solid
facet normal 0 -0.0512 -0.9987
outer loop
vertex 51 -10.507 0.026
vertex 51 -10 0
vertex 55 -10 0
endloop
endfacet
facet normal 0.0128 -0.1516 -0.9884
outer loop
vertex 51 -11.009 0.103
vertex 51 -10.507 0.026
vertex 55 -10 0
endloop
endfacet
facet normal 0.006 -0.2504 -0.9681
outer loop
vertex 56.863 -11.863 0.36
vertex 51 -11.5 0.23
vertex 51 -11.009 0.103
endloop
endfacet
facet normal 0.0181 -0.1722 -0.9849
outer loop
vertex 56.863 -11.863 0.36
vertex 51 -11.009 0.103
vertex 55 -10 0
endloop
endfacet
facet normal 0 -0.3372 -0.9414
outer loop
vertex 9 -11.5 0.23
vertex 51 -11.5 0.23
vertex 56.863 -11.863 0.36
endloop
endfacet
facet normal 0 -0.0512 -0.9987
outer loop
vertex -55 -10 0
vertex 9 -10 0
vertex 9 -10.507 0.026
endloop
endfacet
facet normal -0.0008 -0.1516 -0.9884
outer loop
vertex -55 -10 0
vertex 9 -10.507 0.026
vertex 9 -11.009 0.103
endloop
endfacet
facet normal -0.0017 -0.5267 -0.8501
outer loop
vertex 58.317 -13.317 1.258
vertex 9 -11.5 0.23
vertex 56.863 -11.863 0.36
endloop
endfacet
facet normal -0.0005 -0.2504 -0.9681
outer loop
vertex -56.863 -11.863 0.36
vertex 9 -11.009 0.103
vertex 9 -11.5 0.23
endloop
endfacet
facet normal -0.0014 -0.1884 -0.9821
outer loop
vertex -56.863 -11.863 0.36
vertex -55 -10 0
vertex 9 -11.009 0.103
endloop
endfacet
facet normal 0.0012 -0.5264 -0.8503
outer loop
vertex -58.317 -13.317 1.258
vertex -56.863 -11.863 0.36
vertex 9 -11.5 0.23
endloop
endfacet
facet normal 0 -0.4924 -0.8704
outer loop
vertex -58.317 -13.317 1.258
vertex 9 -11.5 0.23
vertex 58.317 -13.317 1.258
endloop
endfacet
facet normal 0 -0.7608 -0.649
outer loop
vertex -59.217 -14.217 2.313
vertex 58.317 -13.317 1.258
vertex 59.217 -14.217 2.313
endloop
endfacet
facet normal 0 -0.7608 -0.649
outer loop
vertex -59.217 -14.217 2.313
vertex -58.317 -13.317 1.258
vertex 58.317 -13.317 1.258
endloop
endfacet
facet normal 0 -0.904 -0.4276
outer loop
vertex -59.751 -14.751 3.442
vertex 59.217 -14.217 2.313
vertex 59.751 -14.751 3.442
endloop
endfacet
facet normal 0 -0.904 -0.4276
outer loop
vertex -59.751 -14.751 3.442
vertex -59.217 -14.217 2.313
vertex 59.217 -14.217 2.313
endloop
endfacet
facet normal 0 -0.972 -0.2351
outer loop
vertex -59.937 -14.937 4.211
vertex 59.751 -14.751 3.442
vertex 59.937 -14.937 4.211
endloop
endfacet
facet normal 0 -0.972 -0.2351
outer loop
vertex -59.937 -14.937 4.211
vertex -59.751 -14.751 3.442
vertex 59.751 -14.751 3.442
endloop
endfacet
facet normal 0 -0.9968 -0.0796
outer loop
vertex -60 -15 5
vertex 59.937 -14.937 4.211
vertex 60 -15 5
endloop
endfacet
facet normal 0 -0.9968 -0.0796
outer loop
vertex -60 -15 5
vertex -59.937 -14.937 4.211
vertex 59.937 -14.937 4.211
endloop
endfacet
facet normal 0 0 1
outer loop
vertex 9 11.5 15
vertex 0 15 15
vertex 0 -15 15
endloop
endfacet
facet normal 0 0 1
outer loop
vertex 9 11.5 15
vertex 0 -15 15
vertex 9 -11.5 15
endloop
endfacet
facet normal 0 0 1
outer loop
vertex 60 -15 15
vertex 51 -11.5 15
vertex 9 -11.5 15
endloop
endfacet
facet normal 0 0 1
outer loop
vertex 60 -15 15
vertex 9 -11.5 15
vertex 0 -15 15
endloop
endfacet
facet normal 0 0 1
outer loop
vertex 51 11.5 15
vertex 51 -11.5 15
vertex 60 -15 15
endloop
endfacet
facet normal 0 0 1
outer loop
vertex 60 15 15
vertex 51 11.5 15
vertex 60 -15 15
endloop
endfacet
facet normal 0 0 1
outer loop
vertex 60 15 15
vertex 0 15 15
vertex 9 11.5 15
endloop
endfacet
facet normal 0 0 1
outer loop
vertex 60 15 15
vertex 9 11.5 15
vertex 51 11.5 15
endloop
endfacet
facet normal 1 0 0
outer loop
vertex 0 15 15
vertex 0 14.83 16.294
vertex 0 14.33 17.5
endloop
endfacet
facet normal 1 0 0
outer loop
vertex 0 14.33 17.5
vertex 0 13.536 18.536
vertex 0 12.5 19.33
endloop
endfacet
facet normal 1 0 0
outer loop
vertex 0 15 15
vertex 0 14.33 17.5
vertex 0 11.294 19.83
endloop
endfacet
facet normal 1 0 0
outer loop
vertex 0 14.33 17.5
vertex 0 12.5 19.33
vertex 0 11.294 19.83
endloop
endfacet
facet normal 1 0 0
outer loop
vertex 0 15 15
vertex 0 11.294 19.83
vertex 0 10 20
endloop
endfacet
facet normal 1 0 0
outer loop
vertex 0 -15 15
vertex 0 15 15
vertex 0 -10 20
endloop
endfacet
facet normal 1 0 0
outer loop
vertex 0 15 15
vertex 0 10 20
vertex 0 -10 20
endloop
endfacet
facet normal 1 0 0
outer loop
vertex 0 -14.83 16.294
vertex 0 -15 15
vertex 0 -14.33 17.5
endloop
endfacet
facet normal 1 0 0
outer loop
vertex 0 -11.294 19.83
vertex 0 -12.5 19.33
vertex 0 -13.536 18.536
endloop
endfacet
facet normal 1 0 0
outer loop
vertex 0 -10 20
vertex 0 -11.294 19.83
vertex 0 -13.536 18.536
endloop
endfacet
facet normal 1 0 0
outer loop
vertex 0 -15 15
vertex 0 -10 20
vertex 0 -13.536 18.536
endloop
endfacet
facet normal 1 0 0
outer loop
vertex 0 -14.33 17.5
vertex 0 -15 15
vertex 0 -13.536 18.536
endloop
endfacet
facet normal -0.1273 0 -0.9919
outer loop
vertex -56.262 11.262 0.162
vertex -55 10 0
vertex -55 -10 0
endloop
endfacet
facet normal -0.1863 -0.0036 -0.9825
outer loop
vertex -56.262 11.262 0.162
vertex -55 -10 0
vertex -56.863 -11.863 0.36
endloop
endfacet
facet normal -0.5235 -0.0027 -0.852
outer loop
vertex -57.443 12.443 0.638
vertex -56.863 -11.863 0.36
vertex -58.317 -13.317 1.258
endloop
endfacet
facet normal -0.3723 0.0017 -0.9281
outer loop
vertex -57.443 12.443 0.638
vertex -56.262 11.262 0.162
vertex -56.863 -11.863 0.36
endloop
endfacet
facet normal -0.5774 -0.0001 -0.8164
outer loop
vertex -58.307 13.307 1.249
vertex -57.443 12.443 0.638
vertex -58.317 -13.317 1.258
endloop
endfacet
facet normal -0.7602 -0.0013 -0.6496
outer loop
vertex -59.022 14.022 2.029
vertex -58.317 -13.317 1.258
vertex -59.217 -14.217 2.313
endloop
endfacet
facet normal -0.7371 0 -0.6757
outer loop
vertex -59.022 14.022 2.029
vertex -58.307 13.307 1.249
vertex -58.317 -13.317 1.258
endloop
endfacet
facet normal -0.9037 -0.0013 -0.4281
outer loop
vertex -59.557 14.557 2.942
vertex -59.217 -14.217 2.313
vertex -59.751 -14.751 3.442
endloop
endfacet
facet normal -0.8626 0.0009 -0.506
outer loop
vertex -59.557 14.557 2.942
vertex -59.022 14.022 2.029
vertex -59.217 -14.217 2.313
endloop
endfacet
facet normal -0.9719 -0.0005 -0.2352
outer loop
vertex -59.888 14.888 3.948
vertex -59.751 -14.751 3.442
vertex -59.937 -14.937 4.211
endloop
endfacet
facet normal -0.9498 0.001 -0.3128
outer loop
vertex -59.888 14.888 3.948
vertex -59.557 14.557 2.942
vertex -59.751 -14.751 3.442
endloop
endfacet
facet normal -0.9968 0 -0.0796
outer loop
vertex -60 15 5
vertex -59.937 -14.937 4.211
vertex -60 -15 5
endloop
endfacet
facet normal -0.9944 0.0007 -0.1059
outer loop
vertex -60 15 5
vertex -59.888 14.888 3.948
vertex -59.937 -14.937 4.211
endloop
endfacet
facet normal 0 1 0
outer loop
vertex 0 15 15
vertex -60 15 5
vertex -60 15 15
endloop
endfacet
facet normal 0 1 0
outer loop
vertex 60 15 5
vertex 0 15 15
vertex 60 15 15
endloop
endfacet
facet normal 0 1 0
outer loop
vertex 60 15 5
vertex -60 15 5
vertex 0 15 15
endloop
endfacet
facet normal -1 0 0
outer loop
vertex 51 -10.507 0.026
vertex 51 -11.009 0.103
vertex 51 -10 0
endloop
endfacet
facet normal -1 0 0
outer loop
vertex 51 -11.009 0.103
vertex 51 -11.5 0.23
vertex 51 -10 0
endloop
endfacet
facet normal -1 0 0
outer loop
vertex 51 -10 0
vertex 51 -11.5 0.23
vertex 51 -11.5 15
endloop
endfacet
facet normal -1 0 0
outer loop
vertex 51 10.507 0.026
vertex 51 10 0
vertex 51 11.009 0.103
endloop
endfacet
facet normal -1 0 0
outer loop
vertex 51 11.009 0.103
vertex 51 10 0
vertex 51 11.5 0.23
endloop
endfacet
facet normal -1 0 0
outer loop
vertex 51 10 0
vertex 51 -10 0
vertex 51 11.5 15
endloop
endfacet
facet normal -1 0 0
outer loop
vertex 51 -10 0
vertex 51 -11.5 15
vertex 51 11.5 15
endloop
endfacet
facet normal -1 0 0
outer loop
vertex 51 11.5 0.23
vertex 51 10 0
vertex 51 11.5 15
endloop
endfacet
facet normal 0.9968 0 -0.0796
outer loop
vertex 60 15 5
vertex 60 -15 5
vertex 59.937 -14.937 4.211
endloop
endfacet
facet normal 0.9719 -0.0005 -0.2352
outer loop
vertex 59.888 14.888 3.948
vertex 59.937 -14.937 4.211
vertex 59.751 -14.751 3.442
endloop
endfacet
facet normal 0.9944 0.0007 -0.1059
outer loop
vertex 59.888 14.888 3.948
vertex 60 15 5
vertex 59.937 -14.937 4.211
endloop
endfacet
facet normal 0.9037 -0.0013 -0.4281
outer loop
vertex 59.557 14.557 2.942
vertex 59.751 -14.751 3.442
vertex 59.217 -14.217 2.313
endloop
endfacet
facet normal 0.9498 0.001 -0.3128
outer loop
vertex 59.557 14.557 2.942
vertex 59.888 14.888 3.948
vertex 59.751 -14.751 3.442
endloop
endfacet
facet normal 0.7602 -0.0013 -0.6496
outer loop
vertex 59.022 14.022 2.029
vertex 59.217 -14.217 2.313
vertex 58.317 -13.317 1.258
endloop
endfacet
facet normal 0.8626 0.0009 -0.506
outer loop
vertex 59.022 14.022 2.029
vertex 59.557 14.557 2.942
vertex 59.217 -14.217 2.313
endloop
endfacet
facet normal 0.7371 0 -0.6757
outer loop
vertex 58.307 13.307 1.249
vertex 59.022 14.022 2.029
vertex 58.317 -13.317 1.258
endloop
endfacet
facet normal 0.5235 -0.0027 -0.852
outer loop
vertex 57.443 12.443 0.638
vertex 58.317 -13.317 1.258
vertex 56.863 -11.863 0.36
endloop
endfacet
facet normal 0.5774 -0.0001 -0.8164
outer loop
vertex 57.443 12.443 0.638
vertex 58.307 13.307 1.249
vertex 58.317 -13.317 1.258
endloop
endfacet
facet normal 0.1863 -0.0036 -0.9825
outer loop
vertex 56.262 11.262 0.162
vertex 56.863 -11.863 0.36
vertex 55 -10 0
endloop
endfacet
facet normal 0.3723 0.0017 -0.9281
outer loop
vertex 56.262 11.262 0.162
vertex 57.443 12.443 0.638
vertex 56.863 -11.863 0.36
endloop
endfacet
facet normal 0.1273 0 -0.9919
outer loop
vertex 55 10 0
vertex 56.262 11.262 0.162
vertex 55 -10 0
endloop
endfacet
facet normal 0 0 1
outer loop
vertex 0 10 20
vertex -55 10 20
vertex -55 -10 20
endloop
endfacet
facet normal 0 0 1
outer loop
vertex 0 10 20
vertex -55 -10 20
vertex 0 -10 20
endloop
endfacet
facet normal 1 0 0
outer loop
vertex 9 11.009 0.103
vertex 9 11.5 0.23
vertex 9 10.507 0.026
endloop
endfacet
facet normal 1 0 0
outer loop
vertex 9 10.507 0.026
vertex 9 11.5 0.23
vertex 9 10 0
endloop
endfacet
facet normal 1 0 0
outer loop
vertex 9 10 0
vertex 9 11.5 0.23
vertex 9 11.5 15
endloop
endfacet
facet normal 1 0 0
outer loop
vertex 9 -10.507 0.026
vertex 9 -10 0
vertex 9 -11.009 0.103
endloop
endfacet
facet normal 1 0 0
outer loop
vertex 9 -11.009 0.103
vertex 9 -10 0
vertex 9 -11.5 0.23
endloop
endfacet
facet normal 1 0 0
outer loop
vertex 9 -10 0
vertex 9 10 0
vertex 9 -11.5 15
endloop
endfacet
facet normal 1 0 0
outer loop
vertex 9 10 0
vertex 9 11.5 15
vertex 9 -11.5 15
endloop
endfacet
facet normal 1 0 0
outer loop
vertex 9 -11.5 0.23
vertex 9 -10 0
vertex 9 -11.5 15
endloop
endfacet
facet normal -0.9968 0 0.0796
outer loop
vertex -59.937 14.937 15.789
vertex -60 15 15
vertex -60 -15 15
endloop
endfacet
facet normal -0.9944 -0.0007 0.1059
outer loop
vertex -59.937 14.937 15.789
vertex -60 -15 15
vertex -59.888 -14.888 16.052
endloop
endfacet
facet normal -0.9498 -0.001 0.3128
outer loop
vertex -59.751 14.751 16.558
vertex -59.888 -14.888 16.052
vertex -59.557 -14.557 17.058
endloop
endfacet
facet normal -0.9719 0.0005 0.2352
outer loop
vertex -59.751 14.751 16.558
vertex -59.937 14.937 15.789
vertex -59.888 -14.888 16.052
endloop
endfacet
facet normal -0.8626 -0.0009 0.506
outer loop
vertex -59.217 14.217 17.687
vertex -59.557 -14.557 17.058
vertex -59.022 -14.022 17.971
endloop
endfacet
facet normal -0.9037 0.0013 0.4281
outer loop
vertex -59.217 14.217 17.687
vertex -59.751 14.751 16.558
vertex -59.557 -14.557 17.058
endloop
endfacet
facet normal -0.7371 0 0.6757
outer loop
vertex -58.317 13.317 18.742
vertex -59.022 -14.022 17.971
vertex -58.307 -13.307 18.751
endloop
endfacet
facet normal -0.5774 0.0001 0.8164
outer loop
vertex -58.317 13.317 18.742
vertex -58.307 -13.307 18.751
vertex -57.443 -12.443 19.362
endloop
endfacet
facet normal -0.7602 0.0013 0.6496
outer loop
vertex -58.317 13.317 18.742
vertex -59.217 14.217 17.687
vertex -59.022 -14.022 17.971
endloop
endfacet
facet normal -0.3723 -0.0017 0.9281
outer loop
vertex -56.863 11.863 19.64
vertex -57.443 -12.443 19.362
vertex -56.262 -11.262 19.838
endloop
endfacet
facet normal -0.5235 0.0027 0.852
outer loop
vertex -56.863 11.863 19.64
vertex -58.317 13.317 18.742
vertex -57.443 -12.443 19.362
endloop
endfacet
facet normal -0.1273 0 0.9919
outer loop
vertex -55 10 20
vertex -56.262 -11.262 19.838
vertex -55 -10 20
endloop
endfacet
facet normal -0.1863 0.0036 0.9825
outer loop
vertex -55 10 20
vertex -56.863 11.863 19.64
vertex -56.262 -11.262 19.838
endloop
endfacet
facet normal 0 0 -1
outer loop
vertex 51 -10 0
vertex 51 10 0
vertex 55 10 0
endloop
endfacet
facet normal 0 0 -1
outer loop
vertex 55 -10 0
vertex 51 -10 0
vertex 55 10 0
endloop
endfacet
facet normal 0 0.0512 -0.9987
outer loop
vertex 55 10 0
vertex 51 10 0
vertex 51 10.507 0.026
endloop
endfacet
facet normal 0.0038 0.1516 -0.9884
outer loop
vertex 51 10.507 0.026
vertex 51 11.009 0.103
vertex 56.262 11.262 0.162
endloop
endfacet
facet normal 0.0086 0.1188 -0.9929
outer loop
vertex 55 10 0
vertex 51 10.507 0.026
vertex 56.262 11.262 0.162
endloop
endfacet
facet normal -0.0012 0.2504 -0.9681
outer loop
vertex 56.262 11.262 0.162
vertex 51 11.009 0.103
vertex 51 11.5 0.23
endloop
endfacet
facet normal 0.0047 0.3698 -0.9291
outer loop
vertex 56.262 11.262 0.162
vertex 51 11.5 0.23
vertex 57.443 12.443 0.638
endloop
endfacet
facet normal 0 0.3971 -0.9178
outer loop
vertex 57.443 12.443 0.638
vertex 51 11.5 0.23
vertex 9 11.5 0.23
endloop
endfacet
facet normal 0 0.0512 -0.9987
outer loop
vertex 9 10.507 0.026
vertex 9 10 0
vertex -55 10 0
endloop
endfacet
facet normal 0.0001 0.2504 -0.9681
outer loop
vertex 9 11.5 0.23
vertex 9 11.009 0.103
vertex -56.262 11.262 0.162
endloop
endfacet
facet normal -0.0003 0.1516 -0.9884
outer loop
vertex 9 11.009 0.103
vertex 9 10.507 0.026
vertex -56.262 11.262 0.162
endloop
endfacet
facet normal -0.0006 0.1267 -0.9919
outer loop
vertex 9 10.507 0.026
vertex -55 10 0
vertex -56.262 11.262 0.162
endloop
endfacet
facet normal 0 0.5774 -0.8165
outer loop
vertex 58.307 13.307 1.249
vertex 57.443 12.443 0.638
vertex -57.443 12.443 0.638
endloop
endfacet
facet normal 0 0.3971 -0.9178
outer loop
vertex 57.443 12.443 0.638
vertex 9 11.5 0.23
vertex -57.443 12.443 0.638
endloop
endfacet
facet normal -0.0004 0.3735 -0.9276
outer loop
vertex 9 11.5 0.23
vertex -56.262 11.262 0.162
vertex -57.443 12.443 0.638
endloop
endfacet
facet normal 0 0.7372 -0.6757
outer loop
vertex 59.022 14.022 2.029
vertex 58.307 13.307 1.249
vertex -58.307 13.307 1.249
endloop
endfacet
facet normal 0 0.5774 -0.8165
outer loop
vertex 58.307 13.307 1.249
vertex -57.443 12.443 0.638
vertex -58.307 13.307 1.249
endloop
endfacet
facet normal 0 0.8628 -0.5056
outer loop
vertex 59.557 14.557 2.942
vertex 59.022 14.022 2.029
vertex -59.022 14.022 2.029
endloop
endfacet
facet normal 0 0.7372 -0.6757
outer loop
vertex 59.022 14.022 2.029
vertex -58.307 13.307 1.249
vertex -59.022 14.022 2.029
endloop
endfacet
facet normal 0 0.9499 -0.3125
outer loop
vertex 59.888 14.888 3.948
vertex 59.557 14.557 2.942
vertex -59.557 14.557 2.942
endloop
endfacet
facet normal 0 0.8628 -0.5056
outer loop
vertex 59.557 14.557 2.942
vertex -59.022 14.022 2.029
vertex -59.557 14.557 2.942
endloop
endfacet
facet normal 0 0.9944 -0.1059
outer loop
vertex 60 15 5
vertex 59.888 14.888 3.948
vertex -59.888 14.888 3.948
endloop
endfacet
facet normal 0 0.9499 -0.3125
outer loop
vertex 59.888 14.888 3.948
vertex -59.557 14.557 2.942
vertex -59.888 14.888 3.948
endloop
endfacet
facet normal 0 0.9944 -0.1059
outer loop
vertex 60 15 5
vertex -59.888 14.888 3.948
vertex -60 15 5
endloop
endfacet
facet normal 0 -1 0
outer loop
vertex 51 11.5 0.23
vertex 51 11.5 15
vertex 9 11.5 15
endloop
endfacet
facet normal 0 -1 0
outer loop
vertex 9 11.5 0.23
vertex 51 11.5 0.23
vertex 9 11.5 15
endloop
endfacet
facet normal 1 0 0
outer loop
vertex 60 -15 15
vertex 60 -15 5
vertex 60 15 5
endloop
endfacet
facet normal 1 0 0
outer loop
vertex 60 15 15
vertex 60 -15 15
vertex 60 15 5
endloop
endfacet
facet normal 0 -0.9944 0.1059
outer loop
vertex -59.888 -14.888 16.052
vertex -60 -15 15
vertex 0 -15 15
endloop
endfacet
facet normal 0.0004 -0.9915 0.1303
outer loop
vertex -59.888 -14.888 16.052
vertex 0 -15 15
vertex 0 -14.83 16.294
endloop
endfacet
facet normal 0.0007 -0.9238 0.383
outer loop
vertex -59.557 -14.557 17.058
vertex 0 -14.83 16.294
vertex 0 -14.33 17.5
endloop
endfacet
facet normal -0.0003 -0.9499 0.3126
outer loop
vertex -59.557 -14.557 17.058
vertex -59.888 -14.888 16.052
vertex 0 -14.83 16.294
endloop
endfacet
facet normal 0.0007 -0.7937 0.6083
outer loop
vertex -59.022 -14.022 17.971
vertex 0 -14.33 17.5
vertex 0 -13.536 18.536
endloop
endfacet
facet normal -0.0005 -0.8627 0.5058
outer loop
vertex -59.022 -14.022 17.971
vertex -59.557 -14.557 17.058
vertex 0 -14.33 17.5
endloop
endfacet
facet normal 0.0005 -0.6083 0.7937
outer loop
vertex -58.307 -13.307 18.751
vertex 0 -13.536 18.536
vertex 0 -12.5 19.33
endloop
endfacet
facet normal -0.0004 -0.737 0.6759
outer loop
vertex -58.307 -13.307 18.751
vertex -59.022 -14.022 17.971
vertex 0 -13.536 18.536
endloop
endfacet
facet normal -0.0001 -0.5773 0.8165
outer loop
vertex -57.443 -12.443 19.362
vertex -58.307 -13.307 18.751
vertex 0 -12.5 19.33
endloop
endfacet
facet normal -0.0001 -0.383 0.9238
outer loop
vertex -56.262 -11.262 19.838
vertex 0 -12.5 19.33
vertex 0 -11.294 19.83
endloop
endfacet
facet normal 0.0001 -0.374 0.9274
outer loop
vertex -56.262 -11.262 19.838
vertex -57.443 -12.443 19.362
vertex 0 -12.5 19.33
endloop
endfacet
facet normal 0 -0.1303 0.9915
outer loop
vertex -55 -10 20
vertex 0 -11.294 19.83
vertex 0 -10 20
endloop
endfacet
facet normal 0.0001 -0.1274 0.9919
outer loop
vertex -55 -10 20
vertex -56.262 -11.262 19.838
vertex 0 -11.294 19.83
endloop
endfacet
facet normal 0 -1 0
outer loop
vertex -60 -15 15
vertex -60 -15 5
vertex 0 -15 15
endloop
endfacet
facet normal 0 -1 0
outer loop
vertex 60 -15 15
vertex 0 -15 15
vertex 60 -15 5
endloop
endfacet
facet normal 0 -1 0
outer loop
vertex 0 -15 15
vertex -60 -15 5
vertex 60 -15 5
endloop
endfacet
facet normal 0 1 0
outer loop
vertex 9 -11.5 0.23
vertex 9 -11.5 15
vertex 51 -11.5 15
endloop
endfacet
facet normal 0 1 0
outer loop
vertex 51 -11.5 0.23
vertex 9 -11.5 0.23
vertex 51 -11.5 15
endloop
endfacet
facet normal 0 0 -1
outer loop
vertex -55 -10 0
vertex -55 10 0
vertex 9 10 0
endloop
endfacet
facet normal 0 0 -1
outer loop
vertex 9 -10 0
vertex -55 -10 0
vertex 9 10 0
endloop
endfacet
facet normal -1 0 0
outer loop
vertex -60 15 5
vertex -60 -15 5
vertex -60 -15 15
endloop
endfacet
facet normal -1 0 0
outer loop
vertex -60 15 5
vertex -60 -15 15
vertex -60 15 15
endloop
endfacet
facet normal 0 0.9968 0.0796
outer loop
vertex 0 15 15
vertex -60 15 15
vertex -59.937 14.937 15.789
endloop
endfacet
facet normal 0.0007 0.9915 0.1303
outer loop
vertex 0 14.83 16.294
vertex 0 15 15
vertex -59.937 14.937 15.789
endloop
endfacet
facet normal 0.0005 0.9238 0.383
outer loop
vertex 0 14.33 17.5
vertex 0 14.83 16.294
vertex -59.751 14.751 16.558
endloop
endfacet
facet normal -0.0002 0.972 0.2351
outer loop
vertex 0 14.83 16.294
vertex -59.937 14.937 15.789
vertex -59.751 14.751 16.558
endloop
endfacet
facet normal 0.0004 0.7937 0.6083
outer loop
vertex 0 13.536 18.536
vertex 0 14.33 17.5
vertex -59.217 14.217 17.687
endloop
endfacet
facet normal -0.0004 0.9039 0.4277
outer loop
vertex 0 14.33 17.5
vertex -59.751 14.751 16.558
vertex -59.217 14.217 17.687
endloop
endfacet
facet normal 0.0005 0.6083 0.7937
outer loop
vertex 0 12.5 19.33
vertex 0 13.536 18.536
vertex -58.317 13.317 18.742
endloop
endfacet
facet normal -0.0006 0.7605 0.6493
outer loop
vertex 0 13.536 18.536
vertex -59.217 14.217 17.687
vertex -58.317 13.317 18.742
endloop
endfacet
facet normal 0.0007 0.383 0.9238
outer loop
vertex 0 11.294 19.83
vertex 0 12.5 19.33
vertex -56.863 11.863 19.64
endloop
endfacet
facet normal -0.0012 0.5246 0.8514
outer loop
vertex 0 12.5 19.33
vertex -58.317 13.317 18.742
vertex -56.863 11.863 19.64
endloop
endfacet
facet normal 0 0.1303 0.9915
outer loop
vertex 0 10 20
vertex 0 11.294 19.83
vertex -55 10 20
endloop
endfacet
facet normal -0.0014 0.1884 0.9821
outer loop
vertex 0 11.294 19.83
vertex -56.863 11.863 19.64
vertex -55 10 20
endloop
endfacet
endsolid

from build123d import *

# Parameters (mm, degrees)
F0_W        = 120
F0_H        = 30
F1_DEPTH    = 20
F3_DEPTH    = 25
F4_DEPTH    = 5
F5_T1_DEPTH = 85
F5_T3_DEPTH = 145
F5_T5_DEPTH = 55


# Not quite as in the source:
# - a fillet or chamfer that OpenCascade refuses, or shapes differently, is made with other operations: its cross-section is extruded or revolved along the edge and cut away or added


with BuildPart() as f1:
    # F0 (on Top) → F1 (new body)
    with BuildSketch(Plane.XY):
        Rectangle(F0_W, F0_H)
    extrude(amount=F1_DEPTH)

    # F2 (on face) → F3 (cut)
    with BuildSketch(Plane.XY.offset(20)):
        Polygon((9, 11.5), (9, 0), (30, 0), (51, 0), (51, 11.5), align=None)
        Polygon((30, 0), (9, 0), (9, -11.5), (51, -11.5), (51, 0), align=None)
    extrude(amount=-F3_DEPTH, mode=Mode.SUBTRACT)

    # F2 (on face) → F4 (cut)
    with BuildSketch(Plane.XY.offset(20)):
        Polygon((0, 15), (0, 0), (9, 0), (9, 11.5), (51, 11.5), (51, 0), (60, 0), (60, 15), align=None)
        Polygon((9, 0), (0, 0), (0, -15), (60, -15), (60, 0), (51, 0), (51, -11.5), (9, -11.5), align=None)
    extrude(amount=-F4_DEPTH, mode=Mode.SUBTRACT)

    # F5: fillet of radius 5 on 7 edges, made by hand

    # F5_s2 → F5_t1 (cut)
    with BuildSketch(Plane.YZ.offset(-72.5)):
        with BuildLine():
            ThreePointArc((-15, 15), (-13.5355339059, 18.5355339059), (-10, 20))
            Line((-10, 20), (-15, 20))
            Line((-15, 20), (-15, 15))
        make_face()
        with BuildLine():
            ThreePointArc((15, 15), (13.5355339059, 18.5355339059), (10, 20))
            Line((10, 20), (15, 20))
            Line((15, 20), (15, 15))
        make_face()
    extrude(amount=F5_T1_DEPTH, mode=Mode.SUBTRACT)

    # F5_s4 → F5_t3 (cut)
    with BuildSketch(Plane.YZ.offset(-72.5)):
        with BuildLine():
            ThreePointArc((-10, 0), (-13.5355339059, 1.4644660941), (-15, 5))
            Line((-15, 5), (-15, 0))
            Line((-15, 0), (-10, 0))
        make_face()
        with BuildLine():
            ThreePointArc((10, 0), (13.5355339059, 1.4644660941), (15, 5))
            Line((15, 5), (15, 0))
            Line((15, 0), (10, 0))
        make_face()
    extrude(amount=F5_T3_DEPTH, mode=Mode.SUBTRACT)

    # F5_s6 → F5_t5 (cut)
    with BuildSketch(Plane.XZ.offset(-27.5)):
        with BuildLine():
            ThreePointArc((60, 5), (58.5355339059, 1.4644660941), (55, 0))
            Line((55, 0), (60, 0))
            Line((60, 0), (60, 5))
        make_face()
        with BuildLine():
            ThreePointArc((-55, 0), (-58.5355339059, 1.4644660941), (-60, 5))
            Line((-60, 5), (-60, 0))
            Line((-60, 0), (-55, 0))
        make_face()
        with BuildLine():
            ThreePointArc((-60, 15), (-58.5355339059, 18.5355339059), (-55, 20))
            Line((-55, 20), (-60, 20))
            Line((-60, 20), (-60, 15))
        make_face()
    extrude(amount=F5_T5_DEPTH, mode=Mode.SUBTRACT)


solid = f1.part
